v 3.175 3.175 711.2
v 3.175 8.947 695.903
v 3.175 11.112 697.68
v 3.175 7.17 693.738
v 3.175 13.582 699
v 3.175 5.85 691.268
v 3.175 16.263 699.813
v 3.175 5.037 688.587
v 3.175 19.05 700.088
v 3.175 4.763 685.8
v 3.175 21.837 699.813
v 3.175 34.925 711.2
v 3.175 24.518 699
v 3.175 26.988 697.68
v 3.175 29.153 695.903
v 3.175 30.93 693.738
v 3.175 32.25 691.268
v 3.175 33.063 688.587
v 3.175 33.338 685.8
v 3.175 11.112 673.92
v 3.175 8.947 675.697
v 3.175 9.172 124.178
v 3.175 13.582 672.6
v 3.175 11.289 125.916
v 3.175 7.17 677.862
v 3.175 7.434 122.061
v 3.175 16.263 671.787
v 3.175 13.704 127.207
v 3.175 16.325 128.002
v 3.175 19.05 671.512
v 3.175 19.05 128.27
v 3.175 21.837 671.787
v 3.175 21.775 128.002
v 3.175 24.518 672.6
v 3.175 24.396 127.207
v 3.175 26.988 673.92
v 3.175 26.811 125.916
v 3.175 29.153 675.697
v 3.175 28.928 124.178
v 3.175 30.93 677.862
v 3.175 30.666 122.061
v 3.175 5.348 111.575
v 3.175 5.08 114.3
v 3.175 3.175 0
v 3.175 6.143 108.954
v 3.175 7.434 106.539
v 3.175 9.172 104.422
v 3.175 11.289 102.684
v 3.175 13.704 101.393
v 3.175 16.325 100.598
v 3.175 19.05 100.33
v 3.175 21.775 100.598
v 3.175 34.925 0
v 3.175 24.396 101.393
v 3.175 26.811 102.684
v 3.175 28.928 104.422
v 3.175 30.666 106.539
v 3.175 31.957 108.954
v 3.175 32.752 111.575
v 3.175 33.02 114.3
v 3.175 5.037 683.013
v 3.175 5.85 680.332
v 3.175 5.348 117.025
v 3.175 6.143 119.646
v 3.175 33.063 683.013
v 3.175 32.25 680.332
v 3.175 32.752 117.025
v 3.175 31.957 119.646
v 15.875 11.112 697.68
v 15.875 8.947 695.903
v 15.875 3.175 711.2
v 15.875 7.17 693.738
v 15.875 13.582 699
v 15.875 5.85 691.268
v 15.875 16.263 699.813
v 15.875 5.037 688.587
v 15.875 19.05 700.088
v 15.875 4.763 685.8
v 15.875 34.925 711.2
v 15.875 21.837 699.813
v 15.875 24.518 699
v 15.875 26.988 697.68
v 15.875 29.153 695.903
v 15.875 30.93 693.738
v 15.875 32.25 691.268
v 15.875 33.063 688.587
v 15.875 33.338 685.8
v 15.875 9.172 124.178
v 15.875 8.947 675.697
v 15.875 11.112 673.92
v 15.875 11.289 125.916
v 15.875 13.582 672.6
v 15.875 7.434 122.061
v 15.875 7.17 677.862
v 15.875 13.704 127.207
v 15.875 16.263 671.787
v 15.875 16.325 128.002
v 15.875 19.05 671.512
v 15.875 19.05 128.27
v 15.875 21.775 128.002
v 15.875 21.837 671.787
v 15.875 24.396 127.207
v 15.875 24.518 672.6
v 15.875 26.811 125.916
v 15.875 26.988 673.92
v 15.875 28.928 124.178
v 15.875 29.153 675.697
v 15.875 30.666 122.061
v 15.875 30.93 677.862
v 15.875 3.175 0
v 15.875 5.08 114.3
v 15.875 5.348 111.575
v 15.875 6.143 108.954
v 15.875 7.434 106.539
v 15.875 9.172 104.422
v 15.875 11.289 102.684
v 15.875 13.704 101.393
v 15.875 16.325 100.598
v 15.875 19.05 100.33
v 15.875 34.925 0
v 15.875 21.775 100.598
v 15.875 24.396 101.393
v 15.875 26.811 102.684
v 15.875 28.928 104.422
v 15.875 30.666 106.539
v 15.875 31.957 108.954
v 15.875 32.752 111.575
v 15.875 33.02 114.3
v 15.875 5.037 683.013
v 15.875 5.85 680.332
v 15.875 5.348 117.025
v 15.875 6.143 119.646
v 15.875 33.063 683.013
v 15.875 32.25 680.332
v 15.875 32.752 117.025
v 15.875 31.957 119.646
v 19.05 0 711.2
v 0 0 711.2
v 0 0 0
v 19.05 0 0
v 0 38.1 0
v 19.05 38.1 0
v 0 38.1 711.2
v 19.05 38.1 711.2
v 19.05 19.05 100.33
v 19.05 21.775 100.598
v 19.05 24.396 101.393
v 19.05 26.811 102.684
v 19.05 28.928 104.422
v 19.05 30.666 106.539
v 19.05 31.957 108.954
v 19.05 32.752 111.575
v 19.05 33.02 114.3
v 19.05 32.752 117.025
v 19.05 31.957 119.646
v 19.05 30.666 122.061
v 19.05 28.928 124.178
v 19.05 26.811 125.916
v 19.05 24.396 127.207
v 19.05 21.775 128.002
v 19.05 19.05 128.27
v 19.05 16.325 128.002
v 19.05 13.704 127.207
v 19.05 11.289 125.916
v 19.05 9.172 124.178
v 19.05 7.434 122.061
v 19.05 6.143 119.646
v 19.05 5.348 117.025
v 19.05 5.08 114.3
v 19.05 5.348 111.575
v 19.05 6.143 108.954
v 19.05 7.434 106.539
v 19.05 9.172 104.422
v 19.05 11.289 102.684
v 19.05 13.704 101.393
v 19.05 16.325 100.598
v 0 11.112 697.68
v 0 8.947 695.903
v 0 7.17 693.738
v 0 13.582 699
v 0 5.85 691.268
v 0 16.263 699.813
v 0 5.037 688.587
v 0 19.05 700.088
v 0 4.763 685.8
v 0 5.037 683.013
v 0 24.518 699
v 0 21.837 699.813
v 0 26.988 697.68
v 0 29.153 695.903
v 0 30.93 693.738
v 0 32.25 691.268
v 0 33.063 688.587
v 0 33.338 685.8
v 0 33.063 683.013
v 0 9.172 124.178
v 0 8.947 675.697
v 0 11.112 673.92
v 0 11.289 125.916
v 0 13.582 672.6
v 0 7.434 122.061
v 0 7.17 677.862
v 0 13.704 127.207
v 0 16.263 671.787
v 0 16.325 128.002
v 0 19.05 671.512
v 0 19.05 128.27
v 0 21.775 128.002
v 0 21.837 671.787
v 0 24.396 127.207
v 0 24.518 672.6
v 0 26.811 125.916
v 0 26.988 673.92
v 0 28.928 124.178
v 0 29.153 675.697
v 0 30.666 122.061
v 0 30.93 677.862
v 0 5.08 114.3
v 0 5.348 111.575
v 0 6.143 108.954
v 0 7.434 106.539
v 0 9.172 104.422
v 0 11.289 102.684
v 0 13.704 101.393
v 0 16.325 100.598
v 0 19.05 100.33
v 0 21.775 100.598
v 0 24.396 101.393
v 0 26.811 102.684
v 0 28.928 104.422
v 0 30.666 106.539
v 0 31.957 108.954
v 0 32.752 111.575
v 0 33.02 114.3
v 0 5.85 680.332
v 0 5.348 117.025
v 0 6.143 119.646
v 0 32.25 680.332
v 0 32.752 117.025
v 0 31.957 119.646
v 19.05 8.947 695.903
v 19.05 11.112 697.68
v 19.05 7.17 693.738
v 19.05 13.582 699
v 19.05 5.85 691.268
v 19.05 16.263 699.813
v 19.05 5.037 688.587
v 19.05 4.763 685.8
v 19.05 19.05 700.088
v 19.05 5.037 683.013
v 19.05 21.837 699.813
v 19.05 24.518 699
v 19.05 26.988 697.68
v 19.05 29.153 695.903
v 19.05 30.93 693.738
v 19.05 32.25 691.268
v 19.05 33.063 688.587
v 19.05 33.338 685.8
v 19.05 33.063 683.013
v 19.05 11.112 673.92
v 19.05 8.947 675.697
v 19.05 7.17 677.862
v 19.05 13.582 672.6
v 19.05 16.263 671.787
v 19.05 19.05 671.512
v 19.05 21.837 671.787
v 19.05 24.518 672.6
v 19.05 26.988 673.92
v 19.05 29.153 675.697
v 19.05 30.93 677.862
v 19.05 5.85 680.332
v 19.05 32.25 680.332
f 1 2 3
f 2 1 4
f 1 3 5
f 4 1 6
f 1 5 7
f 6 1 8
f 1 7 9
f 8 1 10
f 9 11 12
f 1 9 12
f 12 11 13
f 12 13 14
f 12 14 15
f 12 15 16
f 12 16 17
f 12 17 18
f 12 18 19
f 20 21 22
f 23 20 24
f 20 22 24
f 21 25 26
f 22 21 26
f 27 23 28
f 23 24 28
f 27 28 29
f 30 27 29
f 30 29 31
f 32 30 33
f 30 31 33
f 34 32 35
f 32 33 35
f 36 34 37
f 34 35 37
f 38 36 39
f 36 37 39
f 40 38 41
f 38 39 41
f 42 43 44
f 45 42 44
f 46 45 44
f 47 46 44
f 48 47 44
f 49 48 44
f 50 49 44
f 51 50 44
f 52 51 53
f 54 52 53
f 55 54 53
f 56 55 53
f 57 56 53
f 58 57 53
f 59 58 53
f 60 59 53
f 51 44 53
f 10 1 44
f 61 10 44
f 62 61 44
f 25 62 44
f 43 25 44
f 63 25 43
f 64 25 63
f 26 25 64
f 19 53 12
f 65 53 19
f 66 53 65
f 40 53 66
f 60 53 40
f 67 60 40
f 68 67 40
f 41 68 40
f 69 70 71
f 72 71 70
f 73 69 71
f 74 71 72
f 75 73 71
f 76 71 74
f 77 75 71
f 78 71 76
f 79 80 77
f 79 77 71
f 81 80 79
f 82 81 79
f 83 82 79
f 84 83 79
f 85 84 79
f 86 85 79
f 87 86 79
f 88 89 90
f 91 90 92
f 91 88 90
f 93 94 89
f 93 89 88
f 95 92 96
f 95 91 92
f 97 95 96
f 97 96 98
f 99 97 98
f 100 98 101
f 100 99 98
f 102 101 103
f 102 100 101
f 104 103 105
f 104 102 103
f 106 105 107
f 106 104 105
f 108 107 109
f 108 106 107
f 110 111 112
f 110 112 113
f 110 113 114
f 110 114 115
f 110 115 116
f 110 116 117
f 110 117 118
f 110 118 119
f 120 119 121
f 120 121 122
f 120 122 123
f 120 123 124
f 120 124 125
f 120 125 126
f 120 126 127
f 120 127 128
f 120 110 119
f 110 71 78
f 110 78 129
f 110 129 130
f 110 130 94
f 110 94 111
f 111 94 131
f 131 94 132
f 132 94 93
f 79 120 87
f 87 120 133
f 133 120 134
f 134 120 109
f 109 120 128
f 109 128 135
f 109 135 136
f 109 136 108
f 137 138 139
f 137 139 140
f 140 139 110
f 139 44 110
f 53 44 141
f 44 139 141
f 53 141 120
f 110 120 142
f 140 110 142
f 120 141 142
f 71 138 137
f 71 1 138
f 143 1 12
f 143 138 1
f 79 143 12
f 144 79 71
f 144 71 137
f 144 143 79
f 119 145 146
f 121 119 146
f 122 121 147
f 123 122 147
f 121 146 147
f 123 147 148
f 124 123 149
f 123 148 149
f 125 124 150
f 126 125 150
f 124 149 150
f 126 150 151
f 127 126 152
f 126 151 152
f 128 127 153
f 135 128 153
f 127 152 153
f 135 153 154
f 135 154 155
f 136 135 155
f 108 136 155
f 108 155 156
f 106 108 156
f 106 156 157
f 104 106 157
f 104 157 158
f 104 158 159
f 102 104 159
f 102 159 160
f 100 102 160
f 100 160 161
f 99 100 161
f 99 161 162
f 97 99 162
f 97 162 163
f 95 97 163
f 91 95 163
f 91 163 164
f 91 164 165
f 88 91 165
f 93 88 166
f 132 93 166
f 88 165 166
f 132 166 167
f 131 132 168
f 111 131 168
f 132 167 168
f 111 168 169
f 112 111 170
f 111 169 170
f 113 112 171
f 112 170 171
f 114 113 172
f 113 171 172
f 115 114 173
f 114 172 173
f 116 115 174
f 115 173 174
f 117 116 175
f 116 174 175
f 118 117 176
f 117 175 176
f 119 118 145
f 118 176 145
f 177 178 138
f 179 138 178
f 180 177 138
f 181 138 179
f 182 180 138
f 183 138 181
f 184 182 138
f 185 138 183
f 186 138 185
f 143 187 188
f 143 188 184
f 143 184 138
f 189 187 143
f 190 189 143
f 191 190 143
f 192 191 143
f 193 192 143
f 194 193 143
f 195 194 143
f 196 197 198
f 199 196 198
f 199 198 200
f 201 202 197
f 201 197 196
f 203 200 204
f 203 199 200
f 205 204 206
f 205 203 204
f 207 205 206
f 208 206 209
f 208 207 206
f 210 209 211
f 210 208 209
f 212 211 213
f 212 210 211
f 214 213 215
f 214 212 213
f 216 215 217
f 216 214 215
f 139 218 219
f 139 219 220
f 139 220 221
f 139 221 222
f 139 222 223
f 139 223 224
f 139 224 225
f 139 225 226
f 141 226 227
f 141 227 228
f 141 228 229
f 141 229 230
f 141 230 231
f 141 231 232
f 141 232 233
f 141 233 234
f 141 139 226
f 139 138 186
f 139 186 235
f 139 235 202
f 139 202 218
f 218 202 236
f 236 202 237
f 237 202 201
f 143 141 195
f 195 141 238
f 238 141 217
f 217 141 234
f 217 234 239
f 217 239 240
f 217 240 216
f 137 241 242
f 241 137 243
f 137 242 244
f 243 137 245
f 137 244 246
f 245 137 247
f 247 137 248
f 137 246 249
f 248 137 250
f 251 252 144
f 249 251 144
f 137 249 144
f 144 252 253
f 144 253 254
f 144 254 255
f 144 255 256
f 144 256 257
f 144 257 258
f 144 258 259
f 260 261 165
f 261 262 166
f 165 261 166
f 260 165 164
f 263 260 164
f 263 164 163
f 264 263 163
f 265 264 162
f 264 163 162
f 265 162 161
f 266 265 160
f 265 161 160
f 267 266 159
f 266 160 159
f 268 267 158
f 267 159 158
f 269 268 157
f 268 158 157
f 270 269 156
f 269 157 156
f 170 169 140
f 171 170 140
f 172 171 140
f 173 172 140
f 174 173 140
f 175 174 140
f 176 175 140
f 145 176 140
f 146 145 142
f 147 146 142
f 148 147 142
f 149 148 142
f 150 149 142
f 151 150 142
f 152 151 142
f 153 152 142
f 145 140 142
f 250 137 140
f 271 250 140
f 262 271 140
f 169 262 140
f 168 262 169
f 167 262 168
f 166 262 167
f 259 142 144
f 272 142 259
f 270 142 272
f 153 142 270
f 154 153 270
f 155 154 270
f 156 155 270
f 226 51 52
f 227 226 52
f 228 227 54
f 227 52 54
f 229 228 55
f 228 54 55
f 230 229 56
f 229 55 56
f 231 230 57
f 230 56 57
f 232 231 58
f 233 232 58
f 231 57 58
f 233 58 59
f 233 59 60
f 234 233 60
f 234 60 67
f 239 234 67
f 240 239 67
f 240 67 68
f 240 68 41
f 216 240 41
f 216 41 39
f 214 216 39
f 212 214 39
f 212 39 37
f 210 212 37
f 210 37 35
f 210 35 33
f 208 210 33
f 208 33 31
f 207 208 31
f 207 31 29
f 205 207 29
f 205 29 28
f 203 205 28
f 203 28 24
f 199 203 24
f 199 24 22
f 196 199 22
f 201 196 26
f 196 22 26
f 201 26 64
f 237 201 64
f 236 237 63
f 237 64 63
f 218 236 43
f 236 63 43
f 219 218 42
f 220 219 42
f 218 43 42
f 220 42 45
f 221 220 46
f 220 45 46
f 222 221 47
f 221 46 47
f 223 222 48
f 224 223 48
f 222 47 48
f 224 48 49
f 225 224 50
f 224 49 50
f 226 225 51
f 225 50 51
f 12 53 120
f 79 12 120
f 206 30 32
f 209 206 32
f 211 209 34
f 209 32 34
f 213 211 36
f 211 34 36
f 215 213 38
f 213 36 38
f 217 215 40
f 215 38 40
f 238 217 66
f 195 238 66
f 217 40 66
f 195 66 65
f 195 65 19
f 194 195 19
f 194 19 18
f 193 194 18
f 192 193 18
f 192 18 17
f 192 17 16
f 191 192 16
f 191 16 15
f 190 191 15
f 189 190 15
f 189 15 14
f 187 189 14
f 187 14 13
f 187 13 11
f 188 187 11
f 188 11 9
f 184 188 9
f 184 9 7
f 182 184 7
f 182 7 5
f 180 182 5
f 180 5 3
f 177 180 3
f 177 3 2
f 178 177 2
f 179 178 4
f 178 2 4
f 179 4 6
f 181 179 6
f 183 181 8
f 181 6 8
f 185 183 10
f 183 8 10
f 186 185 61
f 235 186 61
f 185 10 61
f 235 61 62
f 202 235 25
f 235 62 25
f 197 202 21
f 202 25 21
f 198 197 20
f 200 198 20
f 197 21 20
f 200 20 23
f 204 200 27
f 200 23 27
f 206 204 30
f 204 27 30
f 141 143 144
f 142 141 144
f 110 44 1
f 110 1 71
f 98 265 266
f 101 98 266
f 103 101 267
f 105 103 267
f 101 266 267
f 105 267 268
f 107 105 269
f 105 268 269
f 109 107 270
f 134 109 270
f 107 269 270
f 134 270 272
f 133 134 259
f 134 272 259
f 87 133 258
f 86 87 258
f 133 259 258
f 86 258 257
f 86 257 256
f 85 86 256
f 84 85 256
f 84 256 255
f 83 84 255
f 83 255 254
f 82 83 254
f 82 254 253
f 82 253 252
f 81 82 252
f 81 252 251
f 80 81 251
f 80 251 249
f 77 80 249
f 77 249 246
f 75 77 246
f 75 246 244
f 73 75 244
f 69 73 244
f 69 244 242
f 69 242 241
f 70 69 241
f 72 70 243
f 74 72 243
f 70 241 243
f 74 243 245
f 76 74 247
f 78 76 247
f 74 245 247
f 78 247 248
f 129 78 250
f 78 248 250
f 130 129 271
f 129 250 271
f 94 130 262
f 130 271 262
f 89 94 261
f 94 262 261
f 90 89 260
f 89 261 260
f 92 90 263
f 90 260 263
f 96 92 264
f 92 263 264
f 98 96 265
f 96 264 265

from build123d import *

# Parameters (mm, degrees)
SKETCH1_W           = 19.05
SKETCH1_H           = 38.1
SKETCH1_W_2         = 12.7
SKETCH1_H_2         = 31.75
EXTRUDE_THIN1_DEPTH = 711.2
SKETCH3_R           = 13.97
CUT_EXTRUDE2_DEPTH  = 713.474527615
SKETCH4_R           = 14.2875
CUT_EXTRUDE3_DEPTH  = 713.474527615


with BuildPart() as part:
    # Sketch1 → Extrude-Thin1 (new body)
    with BuildSketch(Plane.XY):
        with Locations((9.525, 19.05)):
            Rectangle(SKETCH1_W, SKETCH1_H)
        with Locations((9.525, 19.05)):
            Rectangle(SKETCH1_W_2, SKETCH1_H_2, mode=Mode.SUBTRACT)
    extrude(amount=EXTRUDE_THIN1_DEPTH)

    # Sketch3 → Cut-Extrude2 (cut, through all)
    with BuildSketch(Plane(origin=(19.05, 0, 0), x_dir=(0, 0, -1), z_dir=(1, 0, 0))):
        with Locations((-114.3, 19.05)):
            Circle(SKETCH3_R)
    extrude(amount=-CUT_EXTRUDE2_DEPTH, mode=Mode.SUBTRACT)

    # Sketch4 → Cut-Extrude3 (cut, through all)
    with BuildSketch(Plane(origin=(19.05, 0, 0), x_dir=(0, 0, -1), z_dir=(1, 0, 0))):
        with Locations((-685.8, 19.05)):
            Circle(SKETCH4_R)
    extrude(amount=-CUT_EXTRUDE3_DEPTH, mode=Mode.SUBTRACT)


solid = part.part
